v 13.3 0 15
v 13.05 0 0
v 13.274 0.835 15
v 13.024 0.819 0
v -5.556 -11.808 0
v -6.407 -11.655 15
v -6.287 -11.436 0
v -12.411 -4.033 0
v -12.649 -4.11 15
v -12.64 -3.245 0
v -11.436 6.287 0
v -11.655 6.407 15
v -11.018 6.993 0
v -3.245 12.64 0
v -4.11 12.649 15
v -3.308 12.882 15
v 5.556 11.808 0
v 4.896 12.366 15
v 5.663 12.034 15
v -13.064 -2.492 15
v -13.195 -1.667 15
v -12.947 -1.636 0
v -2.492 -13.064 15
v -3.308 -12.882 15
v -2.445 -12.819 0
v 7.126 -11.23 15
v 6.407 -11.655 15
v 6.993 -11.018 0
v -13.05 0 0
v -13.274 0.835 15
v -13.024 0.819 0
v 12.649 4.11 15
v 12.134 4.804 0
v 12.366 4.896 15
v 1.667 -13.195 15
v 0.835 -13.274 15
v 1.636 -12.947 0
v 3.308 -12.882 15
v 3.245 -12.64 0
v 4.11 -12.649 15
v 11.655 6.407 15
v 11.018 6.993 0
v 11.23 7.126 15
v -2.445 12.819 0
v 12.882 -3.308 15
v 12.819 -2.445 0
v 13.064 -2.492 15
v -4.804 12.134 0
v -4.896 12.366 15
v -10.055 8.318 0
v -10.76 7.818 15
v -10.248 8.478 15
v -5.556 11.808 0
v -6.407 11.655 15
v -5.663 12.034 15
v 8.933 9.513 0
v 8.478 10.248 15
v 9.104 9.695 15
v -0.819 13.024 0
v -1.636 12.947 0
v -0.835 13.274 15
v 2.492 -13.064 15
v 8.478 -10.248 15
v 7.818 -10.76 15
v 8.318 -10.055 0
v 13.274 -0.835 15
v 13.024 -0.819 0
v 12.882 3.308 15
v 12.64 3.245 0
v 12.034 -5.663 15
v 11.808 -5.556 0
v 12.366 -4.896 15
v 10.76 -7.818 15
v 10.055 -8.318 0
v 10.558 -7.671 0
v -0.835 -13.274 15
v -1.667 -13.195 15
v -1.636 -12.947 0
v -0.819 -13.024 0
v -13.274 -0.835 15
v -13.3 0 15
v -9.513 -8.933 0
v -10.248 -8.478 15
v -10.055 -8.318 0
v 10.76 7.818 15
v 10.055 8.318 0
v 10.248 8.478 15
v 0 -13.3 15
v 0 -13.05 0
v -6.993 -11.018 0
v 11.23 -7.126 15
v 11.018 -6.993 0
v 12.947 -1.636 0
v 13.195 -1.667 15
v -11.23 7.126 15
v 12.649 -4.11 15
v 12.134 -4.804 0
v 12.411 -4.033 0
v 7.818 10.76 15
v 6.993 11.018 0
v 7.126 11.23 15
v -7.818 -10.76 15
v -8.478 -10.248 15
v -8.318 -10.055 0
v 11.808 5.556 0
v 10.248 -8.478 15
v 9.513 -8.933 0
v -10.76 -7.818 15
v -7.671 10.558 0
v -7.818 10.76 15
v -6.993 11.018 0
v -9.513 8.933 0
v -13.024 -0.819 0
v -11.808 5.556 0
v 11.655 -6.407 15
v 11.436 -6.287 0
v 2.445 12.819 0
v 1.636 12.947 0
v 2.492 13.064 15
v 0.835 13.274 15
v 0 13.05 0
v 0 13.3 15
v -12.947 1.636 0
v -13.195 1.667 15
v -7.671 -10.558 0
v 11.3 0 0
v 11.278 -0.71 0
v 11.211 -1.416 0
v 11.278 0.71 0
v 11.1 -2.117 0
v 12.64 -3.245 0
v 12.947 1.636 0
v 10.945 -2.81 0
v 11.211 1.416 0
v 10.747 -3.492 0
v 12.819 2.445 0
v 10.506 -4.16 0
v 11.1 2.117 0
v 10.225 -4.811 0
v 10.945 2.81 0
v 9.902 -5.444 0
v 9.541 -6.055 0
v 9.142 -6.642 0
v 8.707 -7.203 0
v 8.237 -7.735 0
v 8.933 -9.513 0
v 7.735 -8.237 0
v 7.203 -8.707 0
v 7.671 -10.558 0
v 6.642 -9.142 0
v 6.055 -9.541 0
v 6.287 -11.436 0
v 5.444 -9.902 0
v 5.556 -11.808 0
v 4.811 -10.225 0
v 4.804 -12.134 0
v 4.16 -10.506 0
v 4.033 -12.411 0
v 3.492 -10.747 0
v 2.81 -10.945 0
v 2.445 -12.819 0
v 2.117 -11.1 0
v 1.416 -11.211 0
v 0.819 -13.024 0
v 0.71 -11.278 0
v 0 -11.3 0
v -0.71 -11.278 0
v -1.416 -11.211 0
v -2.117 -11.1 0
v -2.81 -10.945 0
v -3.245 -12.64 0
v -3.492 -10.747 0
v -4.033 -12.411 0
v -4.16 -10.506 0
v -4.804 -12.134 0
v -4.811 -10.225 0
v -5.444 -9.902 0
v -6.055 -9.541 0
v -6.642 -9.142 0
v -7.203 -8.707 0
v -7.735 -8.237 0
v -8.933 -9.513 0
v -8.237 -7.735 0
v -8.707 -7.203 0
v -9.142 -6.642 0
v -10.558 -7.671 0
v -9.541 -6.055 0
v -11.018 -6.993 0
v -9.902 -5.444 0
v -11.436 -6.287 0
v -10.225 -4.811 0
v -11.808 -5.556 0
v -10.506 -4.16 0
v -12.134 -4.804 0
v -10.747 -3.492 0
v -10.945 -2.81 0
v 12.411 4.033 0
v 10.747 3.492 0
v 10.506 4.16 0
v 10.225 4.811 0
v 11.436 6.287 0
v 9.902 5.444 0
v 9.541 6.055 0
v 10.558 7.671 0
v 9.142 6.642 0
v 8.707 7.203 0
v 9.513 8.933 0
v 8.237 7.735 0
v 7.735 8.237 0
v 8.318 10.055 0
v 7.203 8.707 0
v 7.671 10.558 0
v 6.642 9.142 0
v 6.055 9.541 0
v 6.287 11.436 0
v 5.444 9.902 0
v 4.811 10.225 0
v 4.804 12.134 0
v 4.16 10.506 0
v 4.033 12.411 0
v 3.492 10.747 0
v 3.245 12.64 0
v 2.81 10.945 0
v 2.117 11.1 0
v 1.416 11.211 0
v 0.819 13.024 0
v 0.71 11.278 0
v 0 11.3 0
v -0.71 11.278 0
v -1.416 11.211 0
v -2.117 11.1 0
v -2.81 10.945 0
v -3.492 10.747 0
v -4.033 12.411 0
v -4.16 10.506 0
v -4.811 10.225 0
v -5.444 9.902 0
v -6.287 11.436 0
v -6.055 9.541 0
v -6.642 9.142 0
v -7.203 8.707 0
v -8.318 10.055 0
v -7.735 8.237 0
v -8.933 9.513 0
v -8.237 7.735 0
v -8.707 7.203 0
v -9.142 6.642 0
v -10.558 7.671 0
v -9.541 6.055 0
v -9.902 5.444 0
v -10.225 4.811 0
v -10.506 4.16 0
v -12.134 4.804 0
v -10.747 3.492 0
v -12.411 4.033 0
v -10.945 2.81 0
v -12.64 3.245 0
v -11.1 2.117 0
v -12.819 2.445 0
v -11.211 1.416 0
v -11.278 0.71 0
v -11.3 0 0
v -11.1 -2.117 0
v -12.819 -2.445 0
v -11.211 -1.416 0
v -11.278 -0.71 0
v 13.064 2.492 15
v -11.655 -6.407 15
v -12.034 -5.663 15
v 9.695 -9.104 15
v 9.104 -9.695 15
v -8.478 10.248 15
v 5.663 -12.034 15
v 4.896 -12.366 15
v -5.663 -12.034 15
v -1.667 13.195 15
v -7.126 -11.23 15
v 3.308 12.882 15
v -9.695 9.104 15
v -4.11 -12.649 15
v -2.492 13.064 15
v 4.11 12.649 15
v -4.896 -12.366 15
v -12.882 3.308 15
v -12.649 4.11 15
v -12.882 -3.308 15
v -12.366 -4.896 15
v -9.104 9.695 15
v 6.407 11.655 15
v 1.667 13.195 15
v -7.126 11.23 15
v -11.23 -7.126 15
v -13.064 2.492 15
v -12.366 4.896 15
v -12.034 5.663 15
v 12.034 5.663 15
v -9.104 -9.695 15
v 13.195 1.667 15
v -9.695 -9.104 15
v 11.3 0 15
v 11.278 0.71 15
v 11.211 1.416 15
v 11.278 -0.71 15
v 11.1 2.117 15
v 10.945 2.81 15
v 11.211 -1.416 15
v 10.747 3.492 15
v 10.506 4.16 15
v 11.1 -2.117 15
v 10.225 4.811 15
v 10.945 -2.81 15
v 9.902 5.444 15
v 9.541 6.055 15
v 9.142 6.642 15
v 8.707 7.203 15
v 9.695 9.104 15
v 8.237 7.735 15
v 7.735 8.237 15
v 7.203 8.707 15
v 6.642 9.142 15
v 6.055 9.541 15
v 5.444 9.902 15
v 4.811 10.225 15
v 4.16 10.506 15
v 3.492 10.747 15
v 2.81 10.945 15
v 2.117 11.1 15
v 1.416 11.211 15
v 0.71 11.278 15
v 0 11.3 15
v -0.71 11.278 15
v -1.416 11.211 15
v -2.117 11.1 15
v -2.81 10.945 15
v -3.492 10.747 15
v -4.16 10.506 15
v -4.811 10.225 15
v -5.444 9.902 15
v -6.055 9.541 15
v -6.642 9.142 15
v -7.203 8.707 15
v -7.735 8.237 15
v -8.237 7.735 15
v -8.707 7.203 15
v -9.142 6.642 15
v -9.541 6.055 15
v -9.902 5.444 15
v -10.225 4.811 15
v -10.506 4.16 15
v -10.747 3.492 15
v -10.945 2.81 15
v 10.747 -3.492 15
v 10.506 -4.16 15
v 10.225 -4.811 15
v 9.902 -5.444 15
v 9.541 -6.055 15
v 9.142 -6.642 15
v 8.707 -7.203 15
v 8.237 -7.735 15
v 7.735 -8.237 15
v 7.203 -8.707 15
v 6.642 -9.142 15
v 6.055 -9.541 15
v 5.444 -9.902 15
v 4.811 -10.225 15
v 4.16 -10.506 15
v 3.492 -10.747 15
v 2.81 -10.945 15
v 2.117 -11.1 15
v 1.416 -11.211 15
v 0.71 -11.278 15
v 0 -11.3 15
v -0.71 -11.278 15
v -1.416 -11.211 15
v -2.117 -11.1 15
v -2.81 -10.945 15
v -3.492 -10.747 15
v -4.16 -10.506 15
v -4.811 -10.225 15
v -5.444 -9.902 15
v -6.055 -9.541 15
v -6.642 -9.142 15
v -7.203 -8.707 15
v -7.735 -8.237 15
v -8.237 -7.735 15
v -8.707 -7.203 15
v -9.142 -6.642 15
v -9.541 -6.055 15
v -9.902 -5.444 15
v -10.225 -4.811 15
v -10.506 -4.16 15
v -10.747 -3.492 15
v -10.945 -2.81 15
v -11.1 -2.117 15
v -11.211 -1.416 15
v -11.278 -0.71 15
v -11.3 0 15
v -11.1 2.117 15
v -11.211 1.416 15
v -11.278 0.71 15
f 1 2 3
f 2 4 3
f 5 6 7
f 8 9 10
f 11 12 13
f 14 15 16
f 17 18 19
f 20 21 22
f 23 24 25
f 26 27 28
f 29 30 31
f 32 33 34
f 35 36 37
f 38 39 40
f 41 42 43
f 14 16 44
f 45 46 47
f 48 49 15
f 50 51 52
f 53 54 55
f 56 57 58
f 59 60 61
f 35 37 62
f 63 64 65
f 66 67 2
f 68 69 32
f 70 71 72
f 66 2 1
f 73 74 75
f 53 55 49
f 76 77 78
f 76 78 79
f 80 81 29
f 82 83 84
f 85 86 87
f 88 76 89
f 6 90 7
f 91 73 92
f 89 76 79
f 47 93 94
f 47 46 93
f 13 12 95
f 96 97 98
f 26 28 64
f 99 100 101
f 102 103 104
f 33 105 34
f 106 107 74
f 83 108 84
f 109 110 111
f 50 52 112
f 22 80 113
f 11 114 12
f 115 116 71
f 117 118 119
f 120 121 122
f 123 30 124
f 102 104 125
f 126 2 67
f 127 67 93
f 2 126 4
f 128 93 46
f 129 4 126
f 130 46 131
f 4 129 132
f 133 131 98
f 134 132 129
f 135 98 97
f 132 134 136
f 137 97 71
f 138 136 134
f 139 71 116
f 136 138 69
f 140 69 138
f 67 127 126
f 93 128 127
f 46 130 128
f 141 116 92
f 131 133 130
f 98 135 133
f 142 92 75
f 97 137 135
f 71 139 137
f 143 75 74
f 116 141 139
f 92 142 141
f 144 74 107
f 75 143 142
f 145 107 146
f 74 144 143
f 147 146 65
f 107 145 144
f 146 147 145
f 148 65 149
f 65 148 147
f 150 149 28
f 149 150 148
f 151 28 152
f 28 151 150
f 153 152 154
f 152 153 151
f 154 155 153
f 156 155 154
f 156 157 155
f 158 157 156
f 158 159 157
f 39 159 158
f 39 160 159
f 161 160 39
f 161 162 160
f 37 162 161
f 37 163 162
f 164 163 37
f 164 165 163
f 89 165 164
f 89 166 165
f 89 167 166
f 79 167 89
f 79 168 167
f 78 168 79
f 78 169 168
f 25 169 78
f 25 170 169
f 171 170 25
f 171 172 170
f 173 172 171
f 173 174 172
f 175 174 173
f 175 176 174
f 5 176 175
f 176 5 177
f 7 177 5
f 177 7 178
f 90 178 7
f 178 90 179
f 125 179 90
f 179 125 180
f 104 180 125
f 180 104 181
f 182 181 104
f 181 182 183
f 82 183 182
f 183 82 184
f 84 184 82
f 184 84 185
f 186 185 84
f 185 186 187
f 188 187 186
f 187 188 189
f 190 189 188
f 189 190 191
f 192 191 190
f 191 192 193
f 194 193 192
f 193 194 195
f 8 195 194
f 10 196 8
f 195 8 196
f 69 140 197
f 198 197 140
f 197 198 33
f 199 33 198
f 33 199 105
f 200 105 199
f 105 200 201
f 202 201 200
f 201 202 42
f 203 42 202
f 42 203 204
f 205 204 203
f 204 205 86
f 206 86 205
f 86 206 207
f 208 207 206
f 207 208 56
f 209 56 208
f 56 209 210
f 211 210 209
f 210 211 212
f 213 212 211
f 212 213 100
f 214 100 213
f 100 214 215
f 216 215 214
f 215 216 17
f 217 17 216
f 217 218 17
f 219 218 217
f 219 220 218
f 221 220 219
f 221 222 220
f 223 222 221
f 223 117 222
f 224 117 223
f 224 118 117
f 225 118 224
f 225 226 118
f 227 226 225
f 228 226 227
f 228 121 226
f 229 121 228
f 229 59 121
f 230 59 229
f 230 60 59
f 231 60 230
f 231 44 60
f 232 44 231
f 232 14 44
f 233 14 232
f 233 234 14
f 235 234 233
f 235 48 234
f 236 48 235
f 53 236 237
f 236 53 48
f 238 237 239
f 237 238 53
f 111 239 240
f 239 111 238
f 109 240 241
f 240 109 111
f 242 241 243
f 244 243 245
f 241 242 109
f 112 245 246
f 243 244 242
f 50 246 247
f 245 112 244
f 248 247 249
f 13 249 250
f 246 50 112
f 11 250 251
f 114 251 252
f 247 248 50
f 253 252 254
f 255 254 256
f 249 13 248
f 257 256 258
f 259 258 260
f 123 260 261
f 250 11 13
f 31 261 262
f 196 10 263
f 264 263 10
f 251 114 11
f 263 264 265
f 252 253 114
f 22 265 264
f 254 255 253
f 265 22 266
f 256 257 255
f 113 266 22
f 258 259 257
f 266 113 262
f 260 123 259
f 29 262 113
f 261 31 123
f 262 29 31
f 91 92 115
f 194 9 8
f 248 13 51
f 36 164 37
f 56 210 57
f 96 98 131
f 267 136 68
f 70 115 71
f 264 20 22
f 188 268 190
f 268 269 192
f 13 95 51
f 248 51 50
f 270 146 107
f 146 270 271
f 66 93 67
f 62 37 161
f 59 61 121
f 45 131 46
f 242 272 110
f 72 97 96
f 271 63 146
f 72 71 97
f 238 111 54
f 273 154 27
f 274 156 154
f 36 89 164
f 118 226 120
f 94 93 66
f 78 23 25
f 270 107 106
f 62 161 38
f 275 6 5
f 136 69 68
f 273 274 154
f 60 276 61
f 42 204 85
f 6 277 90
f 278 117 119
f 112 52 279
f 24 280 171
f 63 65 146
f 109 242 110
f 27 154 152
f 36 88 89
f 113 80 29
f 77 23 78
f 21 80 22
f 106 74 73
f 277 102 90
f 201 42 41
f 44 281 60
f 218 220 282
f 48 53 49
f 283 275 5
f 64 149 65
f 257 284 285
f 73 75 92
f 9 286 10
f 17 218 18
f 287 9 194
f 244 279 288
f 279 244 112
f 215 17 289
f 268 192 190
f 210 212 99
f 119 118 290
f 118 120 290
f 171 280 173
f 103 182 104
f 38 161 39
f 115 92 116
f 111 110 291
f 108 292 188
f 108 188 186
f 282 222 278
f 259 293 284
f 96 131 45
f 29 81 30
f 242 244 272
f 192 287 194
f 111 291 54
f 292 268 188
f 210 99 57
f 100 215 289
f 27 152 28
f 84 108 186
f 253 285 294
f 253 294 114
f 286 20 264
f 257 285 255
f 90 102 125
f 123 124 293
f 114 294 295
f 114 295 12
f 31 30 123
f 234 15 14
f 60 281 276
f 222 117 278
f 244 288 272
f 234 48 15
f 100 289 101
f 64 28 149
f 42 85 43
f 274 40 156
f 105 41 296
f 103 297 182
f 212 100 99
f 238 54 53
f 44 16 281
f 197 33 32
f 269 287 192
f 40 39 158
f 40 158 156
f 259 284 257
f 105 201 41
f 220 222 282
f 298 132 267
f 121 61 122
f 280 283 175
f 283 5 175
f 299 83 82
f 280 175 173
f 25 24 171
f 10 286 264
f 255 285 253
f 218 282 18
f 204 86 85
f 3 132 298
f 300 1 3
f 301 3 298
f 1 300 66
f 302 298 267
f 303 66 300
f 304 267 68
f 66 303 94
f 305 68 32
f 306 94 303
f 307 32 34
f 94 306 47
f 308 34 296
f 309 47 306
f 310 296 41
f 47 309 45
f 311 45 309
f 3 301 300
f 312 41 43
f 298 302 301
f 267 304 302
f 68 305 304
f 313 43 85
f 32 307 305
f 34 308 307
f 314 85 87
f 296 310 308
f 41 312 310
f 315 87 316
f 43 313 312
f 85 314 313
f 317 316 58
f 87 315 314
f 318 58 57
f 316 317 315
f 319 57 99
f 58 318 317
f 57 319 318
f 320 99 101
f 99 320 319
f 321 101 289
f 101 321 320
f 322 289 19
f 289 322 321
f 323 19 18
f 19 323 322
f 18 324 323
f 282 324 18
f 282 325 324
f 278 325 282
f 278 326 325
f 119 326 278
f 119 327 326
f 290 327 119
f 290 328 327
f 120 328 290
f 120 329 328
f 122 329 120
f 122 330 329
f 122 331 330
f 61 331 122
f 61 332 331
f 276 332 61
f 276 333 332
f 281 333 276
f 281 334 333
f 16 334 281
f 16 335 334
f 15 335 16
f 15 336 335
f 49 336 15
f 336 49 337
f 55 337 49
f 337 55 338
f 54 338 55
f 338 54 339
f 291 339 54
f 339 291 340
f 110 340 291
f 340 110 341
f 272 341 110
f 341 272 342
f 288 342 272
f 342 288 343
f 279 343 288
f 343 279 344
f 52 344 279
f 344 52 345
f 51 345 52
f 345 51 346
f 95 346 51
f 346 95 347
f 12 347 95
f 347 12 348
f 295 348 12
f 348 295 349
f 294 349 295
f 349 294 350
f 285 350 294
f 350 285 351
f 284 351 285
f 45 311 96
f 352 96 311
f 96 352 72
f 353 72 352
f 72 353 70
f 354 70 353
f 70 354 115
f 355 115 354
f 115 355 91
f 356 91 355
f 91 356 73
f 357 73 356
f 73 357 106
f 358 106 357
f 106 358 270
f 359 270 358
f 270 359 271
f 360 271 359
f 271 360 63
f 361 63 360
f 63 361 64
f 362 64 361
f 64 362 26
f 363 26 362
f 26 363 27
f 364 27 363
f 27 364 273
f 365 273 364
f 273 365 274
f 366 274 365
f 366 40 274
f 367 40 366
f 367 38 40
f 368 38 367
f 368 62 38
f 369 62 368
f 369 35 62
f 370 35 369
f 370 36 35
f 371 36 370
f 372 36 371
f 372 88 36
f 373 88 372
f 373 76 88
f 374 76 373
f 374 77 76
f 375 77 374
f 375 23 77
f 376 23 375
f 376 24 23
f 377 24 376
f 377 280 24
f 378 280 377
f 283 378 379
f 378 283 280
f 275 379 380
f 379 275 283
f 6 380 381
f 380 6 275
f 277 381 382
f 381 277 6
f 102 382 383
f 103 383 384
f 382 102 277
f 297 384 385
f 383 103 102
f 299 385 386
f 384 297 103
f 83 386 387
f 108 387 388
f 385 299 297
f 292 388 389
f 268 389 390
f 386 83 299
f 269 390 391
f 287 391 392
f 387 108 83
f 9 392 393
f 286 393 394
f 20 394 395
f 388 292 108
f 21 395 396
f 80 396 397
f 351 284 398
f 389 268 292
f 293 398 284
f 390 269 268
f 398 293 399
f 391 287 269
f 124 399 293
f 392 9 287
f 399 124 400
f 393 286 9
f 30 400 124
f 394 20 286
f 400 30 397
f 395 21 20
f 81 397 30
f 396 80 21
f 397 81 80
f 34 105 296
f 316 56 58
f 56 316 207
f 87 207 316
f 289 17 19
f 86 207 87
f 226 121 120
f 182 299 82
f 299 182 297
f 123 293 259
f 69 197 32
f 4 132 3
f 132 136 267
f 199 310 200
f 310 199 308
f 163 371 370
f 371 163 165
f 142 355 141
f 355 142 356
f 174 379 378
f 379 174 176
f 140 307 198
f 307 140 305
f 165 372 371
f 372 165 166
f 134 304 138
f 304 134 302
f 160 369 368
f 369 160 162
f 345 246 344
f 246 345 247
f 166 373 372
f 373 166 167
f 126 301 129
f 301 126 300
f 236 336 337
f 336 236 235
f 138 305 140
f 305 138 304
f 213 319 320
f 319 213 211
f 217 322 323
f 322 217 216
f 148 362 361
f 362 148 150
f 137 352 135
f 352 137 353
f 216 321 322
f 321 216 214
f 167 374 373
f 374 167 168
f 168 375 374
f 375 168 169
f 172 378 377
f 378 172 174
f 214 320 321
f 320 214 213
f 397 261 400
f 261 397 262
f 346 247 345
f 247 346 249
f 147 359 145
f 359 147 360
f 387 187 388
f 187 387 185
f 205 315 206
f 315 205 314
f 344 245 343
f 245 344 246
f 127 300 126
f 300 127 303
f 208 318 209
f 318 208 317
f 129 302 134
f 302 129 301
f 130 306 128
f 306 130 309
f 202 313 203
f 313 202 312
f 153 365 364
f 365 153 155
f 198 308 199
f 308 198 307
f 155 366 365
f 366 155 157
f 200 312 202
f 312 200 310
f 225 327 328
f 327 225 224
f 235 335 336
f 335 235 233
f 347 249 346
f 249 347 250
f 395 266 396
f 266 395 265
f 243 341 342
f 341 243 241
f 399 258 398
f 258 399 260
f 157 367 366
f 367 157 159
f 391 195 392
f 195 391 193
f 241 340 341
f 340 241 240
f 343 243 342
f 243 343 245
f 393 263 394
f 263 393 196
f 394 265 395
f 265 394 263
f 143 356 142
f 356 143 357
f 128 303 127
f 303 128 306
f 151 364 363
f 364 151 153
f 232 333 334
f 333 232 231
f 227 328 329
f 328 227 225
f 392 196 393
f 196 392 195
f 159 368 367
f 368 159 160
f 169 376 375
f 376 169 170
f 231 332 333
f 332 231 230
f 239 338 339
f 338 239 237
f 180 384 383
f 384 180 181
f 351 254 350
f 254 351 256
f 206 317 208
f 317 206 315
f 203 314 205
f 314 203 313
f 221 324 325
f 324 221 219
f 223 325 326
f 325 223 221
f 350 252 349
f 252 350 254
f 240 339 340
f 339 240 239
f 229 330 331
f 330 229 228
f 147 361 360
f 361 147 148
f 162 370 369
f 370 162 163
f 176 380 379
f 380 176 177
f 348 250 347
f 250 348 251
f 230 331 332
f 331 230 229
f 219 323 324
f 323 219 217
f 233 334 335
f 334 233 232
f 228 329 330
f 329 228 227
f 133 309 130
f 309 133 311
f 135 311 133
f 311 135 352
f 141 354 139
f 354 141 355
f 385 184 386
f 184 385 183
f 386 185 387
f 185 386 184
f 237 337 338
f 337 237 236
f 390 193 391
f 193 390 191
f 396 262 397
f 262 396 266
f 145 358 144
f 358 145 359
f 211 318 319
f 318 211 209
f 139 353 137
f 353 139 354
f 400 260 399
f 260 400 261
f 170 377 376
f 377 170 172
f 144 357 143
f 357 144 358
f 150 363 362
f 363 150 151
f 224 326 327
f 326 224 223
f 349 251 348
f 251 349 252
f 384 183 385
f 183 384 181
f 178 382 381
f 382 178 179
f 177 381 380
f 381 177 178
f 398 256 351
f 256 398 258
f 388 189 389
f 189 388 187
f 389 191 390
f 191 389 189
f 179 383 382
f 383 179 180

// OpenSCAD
//inner radius test piece


//enter pvc pipe radii here (for standard 1" PVC fitting, LPR=16.90; for standard 1" PVC pipe, LPR=13.80;for standard 3/4" CPVC, SPR=11.2; For 32mm (Malawi, Zimbabwe) LPR = 16.5 for fittings; LPR = 13.3 for pipe)

LPR=13.3; // large pipe radius
SPR=8;    // small pipe radius

$fn=100;
//adapter
union(){
difference(){
    cylinder(15,LPR-0.25,LPR);
    translate([0,0,-1]) cylinder(25,LPR-2,LPR-2);
    }
}
